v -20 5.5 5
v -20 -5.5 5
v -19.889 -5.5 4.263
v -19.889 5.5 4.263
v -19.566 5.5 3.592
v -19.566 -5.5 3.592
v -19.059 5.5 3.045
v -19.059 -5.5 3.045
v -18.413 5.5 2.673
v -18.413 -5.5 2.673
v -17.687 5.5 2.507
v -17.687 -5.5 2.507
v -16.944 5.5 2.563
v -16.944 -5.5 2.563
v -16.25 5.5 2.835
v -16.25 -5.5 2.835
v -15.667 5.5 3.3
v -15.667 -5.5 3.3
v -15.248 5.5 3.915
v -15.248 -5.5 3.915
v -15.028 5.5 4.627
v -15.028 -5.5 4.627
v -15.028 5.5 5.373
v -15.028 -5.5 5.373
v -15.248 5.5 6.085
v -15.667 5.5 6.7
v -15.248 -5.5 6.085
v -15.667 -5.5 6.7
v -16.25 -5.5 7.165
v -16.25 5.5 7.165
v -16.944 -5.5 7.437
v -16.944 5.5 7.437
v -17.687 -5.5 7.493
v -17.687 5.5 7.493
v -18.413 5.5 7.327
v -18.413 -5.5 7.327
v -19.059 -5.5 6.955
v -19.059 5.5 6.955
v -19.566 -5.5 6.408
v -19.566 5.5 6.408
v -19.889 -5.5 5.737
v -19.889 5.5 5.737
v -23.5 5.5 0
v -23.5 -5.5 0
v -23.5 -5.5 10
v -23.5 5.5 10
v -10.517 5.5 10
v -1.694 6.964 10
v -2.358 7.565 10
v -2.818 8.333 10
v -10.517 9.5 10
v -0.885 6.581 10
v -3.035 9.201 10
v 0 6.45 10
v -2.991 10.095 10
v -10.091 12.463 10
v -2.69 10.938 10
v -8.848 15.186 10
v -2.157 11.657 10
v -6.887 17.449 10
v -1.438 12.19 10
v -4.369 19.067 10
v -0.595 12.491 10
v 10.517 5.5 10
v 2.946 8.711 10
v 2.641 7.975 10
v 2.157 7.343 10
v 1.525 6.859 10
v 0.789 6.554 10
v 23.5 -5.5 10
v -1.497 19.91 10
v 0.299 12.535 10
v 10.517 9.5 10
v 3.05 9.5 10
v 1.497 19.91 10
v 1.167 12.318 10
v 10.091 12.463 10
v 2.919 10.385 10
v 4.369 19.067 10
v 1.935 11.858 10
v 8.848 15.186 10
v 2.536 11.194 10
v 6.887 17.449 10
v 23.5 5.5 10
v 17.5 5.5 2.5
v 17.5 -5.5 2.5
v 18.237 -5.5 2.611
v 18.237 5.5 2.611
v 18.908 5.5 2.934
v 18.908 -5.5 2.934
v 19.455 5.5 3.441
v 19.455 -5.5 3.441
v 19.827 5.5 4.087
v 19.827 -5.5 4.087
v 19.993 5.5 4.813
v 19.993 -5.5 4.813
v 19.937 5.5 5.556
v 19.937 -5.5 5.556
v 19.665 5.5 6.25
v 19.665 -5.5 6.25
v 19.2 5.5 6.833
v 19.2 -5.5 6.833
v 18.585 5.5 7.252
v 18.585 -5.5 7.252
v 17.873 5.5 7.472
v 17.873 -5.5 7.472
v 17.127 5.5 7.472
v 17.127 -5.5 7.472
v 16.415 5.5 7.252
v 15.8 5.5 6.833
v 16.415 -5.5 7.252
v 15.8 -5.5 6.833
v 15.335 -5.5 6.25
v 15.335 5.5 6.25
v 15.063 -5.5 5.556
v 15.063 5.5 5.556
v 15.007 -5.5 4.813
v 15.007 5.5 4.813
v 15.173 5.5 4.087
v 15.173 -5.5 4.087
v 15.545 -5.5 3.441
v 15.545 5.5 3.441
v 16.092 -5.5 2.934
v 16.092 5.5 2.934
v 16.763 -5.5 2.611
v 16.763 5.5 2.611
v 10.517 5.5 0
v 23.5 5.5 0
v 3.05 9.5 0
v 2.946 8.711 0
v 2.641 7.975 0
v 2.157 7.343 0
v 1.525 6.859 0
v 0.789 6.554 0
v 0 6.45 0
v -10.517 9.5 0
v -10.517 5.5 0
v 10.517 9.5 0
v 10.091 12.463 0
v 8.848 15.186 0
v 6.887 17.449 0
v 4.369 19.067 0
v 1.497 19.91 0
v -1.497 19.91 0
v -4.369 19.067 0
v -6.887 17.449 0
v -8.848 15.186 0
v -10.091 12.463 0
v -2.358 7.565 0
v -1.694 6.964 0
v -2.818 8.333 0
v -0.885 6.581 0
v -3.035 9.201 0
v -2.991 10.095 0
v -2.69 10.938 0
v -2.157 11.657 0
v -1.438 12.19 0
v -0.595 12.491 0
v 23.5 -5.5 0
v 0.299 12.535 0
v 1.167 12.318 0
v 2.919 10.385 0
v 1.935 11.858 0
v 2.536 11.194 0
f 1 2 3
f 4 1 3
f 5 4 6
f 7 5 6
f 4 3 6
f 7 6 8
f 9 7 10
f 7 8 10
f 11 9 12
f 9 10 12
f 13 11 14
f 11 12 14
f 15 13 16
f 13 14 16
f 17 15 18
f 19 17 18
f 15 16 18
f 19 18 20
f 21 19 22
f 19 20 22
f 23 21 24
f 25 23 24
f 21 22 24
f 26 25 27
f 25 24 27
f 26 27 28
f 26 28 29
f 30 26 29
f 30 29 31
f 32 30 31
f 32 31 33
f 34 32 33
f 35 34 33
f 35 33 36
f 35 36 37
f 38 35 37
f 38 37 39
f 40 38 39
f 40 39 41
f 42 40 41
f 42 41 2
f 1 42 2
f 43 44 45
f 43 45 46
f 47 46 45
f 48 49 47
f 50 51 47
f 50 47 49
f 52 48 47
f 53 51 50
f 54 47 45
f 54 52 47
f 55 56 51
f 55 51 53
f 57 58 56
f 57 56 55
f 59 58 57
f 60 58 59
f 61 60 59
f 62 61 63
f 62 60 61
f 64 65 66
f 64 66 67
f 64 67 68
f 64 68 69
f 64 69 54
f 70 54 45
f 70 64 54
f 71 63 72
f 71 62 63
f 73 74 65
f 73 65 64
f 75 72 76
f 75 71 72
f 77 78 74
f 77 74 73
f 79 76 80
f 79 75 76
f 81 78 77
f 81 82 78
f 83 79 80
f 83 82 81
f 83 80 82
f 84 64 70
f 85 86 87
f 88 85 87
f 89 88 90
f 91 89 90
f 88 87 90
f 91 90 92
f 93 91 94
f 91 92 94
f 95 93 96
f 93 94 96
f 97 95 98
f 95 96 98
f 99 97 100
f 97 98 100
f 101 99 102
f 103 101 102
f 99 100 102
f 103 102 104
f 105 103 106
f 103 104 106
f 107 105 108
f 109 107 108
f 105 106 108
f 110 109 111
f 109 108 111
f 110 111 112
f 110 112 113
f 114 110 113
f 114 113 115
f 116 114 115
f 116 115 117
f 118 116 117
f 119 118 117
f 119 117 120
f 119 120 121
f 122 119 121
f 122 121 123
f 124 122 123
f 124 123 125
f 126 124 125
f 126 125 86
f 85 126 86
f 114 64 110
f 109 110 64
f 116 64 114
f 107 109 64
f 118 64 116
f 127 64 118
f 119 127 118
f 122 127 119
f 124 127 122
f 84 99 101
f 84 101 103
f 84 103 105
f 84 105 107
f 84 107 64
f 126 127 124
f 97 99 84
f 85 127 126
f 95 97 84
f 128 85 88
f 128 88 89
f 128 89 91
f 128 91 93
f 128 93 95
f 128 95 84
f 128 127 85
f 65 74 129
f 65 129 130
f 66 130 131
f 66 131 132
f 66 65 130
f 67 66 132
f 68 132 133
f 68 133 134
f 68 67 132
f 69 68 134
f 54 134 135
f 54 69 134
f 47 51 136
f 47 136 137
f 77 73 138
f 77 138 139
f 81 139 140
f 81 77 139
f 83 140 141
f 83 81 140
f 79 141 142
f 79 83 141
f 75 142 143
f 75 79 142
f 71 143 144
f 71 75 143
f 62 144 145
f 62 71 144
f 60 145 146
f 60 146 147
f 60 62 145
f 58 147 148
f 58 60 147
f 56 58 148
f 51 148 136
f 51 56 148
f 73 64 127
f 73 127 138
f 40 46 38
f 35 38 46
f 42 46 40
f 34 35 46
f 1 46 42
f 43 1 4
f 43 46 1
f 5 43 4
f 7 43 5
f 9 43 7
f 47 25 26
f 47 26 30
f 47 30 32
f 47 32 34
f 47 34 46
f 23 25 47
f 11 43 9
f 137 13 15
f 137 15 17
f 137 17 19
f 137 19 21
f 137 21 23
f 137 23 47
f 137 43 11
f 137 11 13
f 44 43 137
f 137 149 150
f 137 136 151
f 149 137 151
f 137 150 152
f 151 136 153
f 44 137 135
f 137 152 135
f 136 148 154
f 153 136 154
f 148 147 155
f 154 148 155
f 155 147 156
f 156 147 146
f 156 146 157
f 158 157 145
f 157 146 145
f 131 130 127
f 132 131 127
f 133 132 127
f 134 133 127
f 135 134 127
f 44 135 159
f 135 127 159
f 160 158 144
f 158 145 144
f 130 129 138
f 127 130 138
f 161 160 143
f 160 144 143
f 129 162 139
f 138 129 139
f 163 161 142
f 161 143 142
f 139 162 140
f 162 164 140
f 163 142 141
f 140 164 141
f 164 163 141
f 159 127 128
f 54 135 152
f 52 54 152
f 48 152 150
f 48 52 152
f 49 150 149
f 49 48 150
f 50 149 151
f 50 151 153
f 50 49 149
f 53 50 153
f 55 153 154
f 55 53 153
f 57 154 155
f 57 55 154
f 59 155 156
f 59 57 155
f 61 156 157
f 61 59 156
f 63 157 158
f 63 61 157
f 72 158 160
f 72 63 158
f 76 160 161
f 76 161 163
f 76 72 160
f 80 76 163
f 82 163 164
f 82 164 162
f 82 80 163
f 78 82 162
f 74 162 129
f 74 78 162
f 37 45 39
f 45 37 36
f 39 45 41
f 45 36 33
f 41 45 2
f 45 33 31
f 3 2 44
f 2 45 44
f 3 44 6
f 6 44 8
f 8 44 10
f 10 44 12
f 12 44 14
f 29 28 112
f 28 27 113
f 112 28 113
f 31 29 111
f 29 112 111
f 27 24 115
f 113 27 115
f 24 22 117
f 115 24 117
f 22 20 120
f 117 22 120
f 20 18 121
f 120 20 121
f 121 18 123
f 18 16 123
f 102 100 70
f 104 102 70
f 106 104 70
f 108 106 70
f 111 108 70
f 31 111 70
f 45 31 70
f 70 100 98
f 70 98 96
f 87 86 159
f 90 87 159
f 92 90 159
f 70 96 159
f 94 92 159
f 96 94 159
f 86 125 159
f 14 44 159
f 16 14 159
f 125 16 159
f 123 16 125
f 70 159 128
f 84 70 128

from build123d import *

# Parameters (mm, degrees)
SKETCH1_W           = 47
SKETCH1_H           = 11
BOSS_EXTRUDE1_DEPTH = 10
CUT_EXTRUDE1_REACH  = 29.807
SKETCH3_R           = 2.5
BOSS_EXTRUDE3_DEPTH = 10


with BuildPart() as part:
    # Sketch1 → Boss-Extrude1 (new body)
    with BuildSketch(Plane.XY):
        Rectangle(SKETCH1_W, SKETCH1_H)
    extrude(amount=BOSS_EXTRUDE1_DEPTH)

    # Sketch3 → Cut-Extrude1 (cut, up to next)
    with BuildSketch(Plane.XZ.offset(5.5), mode=Mode.PRIVATE) as cut_extrude1_sk1:
        with BuildLine():
            ThreePointArc((-20, 5), (-17.5, 2.5), (-15, 5))
            Line((-15, 5), (-17.5, 5))
            Line((-17.5, 5), (-20, 5))
        make_face()
    cut_extrude1_tool1 = extrude(cut_extrude1_sk1.sketch, amount=-CUT_EXTRUDE1_REACH, mode=Mode.PRIVATE) & part.part
    # Sketch3 → Cut-Extrude1 (cut, up to next)
    with BuildSketch(Plane.XZ.offset(5.5), mode=Mode.PRIVATE) as cut_extrude1_sk2:
        with BuildLine():
            Line((-17.5, 5), (-15, 5))
            ThreePointArc((-15, 5), (-17.5, 7.5), (-20, 5))
            Line((-20, 5), (-17.5, 5))
        make_face()
    cut_extrude1_tool2 = extrude(cut_extrude1_sk2.sketch, amount=-CUT_EXTRUDE1_REACH, mode=Mode.PRIVATE) & part.part
    # Sketch3 → Cut-Extrude1 (cut, up to next)
    with BuildSketch(Plane.XZ.offset(5.5), mode=Mode.PRIVATE) as cut_extrude1_sk3:
        with BuildLine():
            ThreePointArc((-20, 5), (-17.5, 2.5), (-15, 5))
            Line((-15, 5), (-17.5, 5))
            Line((-17.5, 5), (-20, 5))
        make_face()
    cut_extrude1_tool3 = extrude(cut_extrude1_sk3.sketch, amount=-CUT_EXTRUDE1_REACH, mode=Mode.PRIVATE) & part.part
    # Sketch3 → Cut-Extrude1 (cut, up to next)
    with BuildSketch(Plane.XZ.offset(5.5), mode=Mode.PRIVATE) as cut_extrude1_sk4:
        with BuildLine():
            Line((-17.5, 5), (-15, 5))
            ThreePointArc((-15, 5), (-17.5, 7.5), (-20, 5))
            Line((-20, 5), (-17.5, 5))
        make_face()
    cut_extrude1_tool4 = extrude(cut_extrude1_sk4.sketch, amount=-CUT_EXTRUDE1_REACH, mode=Mode.PRIVATE) & part.part
    # Sketch3 → Cut-Extrude1 (cut, up to next)
    with BuildSketch(Plane.XZ.offset(5.5), mode=Mode.PRIVATE) as cut_extrude1_sk5:
        with Locations(Location((17.5, 5, 0), (0, 0, 270))):
            Circle(SKETCH3_R)
    cut_extrude1_tool5 = extrude(cut_extrude1_sk5.sketch, amount=-CUT_EXTRUDE1_REACH, mode=Mode.PRIVATE) & part.part
    add(cut_extrude1_tool1.solids().sort_by_distance((-17.5, -5.5, 3.938967))[0], mode=Mode.SUBTRACT)
    add(cut_extrude1_tool2.solids().sort_by_distance((-17.5, -5.5, 6.061033))[0], mode=Mode.SUBTRACT)
    add(cut_extrude1_tool3.solids().sort_by_distance((-17.5, -5.5, 3.938967))[0], mode=Mode.SUBTRACT)
    add(cut_extrude1_tool4.solids().sort_by_distance((-17.5, -5.5, 6.061033))[0], mode=Mode.SUBTRACT)
    add(cut_extrude1_tool5.solids().sort_by_distance((17.5, -5.5, 5))[0], mode=Mode.SUBTRACT)

    # Sketch4 → Boss-Extrude3 (add)
    with BuildSketch(Plane.XY.offset(10)):
        with BuildLine():
            Line((-10.517377717, 5.5), (0, 5.5))
            Line((0, 5.5), (10.517377717, 5.5))
            Line((10.517377717, 5.5), (10.517377717, 9.5))
            ThreePointArc((10.517377717, 9.5), (0, 20.017377717), (-10.517377717, 9.5))
            Line((-10.517377717, 9.5), (-10.517377717, 5.5))
        make_face()
        with BuildLine():
            ThreePointArc((3.05, 9.5), (2.156675683, 7.343324317), (0, 6.45))
            ThreePointArc((0, 6.45), (-2.156675683, 11.656675683), (3.05, 9.5))
        make_face(mode=Mode.SUBTRACT)
    extrude(amount=-BOSS_EXTRUDE3_DEPTH)


solid = part.part
